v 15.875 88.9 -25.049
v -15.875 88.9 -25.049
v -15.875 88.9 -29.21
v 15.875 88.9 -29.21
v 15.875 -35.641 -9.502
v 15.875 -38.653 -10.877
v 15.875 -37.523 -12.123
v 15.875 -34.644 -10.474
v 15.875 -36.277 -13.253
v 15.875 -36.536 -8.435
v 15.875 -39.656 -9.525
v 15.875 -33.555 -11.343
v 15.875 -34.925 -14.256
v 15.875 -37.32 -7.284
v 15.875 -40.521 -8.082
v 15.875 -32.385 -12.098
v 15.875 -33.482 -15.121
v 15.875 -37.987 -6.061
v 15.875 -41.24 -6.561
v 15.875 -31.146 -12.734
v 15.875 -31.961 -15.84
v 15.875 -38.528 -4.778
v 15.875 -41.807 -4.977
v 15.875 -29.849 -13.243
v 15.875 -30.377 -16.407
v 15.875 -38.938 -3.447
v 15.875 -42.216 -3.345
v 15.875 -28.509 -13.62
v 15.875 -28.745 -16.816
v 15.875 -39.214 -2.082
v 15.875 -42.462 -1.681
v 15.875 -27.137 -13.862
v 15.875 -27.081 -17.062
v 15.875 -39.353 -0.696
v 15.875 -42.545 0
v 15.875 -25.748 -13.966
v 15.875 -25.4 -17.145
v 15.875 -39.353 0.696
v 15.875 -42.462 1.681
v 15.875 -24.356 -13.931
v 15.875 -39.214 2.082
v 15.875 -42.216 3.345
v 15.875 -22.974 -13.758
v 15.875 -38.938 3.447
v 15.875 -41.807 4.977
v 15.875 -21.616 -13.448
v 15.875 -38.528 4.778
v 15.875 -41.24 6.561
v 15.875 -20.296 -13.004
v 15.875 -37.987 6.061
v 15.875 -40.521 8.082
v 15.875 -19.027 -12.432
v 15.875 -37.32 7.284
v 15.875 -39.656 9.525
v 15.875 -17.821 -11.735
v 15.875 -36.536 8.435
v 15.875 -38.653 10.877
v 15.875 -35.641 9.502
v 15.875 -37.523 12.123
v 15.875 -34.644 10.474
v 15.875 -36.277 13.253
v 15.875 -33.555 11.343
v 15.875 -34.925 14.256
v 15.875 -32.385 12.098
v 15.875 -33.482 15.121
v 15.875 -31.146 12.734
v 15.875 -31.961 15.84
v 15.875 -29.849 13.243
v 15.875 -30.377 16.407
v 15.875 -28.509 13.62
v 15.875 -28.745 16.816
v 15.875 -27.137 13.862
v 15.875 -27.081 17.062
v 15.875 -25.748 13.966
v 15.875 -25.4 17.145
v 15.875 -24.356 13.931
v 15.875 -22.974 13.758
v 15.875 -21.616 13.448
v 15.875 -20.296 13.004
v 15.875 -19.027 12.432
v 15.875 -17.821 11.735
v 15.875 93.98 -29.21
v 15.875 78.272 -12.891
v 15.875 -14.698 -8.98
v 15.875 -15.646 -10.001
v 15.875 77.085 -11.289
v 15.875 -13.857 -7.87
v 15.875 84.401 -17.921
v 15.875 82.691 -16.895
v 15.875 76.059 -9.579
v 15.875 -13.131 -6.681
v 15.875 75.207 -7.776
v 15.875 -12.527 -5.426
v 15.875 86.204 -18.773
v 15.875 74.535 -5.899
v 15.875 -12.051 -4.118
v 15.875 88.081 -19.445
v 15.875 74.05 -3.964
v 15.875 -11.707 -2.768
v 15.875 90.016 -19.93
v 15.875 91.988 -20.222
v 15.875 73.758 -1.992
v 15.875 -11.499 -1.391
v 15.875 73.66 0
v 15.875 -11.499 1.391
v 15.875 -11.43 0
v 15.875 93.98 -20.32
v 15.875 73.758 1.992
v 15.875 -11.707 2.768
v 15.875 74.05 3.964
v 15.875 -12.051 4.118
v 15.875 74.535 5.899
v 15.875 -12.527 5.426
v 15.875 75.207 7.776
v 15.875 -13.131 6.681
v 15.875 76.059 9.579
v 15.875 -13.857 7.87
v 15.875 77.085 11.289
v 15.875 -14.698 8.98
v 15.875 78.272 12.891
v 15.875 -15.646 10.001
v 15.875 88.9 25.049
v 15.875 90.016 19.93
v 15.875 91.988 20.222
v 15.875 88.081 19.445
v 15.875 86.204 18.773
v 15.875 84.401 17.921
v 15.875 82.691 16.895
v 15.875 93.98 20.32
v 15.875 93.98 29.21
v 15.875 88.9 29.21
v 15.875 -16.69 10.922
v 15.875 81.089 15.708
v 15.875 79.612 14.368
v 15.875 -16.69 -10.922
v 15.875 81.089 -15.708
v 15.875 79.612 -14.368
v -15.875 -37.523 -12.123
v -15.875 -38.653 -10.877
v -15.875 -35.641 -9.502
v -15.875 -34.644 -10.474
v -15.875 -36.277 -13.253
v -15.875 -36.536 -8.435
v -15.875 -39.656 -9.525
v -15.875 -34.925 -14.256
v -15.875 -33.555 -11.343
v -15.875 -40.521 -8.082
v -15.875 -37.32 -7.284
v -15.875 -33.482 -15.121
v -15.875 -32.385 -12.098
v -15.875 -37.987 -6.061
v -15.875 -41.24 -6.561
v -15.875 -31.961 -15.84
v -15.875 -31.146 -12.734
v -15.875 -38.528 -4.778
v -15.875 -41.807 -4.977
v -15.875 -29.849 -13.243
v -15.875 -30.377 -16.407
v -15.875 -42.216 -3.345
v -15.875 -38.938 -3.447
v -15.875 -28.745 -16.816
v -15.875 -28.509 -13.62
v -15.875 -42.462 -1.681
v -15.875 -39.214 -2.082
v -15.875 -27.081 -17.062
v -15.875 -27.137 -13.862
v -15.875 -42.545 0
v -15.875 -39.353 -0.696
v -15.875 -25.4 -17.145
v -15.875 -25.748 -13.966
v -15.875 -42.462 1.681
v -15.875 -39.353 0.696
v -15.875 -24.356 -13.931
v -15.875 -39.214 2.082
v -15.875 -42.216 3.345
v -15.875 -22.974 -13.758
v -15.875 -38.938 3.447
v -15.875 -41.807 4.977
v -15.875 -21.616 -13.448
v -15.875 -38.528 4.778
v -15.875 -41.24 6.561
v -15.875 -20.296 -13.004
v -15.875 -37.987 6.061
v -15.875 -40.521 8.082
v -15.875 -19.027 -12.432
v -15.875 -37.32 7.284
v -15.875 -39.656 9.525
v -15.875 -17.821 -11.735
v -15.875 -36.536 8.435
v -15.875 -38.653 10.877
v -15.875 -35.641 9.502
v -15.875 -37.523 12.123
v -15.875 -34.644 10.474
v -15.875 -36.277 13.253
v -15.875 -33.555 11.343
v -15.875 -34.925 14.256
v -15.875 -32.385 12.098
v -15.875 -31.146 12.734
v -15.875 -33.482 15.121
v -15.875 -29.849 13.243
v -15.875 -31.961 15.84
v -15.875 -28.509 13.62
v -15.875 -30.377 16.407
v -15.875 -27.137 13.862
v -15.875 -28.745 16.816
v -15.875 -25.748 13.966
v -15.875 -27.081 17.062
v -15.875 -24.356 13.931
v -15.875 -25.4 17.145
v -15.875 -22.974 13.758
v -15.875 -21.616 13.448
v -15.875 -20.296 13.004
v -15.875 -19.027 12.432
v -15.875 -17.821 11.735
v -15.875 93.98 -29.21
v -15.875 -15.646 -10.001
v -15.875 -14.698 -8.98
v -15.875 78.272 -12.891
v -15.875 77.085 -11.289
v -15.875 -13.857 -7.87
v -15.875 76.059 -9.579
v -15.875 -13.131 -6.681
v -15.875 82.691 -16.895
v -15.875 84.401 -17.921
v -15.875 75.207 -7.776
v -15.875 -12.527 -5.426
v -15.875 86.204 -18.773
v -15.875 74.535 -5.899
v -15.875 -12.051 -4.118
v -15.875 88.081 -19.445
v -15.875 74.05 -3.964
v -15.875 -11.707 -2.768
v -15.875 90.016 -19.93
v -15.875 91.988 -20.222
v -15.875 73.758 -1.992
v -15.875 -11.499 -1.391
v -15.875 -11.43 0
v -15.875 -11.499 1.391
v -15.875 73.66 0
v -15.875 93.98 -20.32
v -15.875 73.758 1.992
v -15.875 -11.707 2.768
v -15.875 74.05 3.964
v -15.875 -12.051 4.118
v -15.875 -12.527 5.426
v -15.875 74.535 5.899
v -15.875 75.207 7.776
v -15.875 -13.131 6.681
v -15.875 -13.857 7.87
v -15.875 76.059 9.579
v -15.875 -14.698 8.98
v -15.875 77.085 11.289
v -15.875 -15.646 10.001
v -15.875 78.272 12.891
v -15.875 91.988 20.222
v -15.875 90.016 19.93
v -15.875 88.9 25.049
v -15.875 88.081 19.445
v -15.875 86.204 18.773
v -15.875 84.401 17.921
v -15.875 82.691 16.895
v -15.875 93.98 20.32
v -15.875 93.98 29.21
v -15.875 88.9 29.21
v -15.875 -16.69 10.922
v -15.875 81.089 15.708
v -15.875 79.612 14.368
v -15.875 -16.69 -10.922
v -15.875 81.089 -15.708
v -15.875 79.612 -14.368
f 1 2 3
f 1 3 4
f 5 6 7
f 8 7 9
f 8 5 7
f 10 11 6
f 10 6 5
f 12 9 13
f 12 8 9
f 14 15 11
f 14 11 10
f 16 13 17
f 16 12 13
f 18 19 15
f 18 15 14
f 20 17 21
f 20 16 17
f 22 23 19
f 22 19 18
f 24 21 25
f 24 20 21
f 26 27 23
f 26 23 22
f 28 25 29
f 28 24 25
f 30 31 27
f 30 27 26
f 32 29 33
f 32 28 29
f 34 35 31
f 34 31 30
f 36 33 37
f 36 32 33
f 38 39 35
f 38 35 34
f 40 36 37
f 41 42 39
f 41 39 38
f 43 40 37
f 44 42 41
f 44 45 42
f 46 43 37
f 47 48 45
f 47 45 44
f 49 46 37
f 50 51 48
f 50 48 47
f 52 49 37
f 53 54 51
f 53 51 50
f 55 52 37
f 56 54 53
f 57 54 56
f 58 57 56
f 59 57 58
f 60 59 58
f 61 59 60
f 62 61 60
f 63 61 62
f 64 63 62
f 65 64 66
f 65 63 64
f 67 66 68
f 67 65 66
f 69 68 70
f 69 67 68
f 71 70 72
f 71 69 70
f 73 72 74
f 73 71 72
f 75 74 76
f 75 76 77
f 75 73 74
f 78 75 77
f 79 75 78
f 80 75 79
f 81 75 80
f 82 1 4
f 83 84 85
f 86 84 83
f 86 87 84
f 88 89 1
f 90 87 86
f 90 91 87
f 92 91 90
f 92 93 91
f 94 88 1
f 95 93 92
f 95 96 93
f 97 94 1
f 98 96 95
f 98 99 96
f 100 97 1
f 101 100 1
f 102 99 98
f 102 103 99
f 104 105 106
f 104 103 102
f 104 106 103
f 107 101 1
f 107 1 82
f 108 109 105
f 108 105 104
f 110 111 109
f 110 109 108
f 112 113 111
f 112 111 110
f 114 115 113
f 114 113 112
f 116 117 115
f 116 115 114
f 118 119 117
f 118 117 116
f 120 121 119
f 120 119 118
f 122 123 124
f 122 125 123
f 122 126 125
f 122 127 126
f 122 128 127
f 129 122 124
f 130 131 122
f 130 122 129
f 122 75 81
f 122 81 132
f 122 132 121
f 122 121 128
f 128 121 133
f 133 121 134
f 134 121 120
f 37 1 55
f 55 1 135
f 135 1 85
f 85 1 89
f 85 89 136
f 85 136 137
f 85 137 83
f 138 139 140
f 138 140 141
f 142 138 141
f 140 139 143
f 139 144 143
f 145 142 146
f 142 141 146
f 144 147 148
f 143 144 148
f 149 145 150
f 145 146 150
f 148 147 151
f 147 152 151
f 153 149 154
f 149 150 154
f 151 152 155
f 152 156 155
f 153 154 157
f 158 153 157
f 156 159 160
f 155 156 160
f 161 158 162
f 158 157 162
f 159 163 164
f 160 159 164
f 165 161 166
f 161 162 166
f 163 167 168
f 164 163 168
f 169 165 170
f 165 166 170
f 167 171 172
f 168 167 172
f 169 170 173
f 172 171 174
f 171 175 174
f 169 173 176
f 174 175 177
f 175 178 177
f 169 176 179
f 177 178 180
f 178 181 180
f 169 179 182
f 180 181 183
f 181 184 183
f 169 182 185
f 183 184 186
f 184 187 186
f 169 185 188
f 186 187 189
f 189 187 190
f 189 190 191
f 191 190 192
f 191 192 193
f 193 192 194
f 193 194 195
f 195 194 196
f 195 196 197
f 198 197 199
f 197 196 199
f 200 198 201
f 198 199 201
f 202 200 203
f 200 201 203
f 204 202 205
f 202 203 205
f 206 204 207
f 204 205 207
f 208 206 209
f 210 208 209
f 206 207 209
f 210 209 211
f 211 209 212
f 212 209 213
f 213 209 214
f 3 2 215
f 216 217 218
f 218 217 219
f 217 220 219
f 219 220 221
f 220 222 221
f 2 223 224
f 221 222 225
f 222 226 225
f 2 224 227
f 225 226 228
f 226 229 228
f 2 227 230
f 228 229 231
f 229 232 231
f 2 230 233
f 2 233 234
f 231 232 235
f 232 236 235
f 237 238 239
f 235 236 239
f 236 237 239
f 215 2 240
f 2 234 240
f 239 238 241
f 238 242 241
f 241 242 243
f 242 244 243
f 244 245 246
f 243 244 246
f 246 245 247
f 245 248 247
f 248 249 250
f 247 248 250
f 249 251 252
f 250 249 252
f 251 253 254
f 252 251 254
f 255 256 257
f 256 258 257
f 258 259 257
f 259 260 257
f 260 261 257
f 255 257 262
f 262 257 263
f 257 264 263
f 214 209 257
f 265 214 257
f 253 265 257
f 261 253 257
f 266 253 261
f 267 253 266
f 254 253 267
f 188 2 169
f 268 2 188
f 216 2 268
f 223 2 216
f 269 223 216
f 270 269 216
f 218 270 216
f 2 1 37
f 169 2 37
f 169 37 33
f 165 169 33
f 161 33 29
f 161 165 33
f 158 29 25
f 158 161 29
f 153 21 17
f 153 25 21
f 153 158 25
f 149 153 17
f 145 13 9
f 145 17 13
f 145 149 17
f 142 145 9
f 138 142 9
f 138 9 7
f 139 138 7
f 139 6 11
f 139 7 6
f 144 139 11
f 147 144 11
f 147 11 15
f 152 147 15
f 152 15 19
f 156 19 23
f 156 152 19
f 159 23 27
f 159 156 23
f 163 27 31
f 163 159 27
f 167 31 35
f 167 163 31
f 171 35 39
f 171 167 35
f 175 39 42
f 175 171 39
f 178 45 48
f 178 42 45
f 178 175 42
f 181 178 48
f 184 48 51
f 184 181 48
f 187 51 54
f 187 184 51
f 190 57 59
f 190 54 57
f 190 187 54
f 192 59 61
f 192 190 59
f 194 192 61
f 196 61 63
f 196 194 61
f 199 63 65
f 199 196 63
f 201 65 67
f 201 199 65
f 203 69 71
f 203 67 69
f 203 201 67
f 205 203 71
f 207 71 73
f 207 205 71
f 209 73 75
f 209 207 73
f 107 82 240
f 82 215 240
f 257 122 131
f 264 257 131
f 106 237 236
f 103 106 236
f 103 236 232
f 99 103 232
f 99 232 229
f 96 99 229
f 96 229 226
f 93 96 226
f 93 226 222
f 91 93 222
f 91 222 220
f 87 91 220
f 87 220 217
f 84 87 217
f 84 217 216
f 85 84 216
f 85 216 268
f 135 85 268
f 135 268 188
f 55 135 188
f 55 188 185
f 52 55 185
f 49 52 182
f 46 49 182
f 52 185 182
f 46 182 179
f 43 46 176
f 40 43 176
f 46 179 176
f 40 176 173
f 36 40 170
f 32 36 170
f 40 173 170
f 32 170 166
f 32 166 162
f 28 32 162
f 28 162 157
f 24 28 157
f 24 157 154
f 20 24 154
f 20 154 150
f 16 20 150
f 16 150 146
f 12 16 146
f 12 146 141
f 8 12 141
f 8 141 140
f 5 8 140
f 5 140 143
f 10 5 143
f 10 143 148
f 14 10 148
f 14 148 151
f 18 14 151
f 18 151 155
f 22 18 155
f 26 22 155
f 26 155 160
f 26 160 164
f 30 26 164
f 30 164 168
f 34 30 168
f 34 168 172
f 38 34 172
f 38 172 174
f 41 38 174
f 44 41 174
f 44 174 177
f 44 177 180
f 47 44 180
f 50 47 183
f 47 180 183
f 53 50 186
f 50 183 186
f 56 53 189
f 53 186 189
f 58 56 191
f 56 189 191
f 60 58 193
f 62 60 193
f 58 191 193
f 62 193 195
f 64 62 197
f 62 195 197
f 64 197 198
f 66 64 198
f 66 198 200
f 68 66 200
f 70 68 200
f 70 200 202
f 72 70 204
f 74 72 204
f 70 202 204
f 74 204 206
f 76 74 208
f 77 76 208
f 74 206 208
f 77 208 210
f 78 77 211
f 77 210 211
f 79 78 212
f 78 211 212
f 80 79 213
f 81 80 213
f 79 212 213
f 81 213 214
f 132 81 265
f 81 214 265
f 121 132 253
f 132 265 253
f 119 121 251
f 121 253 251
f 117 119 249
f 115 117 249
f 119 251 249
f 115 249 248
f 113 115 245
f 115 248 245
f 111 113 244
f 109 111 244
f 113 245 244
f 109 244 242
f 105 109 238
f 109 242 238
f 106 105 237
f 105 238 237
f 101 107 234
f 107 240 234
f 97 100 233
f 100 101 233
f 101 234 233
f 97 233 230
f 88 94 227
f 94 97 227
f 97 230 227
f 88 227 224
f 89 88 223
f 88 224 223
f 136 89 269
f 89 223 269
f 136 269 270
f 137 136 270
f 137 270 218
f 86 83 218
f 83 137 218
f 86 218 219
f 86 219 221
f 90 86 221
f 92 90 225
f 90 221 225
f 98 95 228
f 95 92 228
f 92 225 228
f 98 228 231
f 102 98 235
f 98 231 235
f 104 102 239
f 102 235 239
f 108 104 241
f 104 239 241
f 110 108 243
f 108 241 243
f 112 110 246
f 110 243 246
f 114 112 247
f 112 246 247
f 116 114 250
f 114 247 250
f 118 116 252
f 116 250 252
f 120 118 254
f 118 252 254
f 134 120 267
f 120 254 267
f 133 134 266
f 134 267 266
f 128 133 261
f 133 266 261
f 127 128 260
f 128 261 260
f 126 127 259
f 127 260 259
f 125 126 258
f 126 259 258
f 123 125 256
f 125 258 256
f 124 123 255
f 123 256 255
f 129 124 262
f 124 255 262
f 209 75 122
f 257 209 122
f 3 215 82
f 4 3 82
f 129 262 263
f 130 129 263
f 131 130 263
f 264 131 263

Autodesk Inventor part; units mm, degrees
ref_plane "YZ Plane" through (0, 0, 0) normal (1, 0, 0) x (0, 1, 0)
sketch "Sketch1" plane through (0, 0, 0) normal (0, 1, 0) x (-1, 0, 0)
  circle A0 centre (0, 0) radius 43.18
  dimension "d0" = 86.36
extrude "Extrusion1" add sketch "Sketch1" against normal blind 63.5
sketch "Sketch2" plane through (0, 0, 0) normal (0, 0, 1) x (1, 0, 0)
  line L0 (-43.18, 0) -> (43.18, 0) projected
  arc A0 (-43.18, 0) -> (43.18, 0) centre (0, 24.003) ccw
  line L1 (-43.18, -63.5) -> (43.18, -63.5) projected
  point P0 (0, 0)
  dimension "d4" = 38.1
extrude "Extrusion2" cut sketch "Sketch2" along normal mid plane 101.6
ref_plane "Work Plane1" through (0, 0, 0) normal (0, -1, 0) x (1, 0, 0)
sketch "Sketch3" plane through (0, 0, 0) normal (0, -1, 0) x (1, 0, 0)
  circle A0 centre (0, 0) radius 38.1
  dimension "d8" = 76.2
extrude "Extrusion3" cut sketch "Sketch3" along normal blind 57.15
sketch "Sketch4" plane through (0, 0, 0) normal (1, 0, 0) x (0, 1, 0)
  circle A0 centre (-25.4, 0) radius 12.7
  point P0 (0, 0)
  dimension "d11" = 25.4
  dimension "d12" = 25.4
  dimension "d13" = 0
extrude "Extrusion4" add sketch "Sketch4" along normal mid plane 78.74
sketch "Sketch5" plane through (0, 0, 0) normal (1, 0, 0) x (0, 1, 0)
  circle A0 centre (-25.4, 0) radius 13.97
  arc A1 (-25.4, 17.145) -> (-25.4, -17.145) centre (-25.4, 0) ccw
  line L0 (-63.5, 43.18) -> (-63.5, -43.18) projected
  circle A2 centre (93.98, 0) radius 20.32
  arc A3 (90.484, -25.1583) -> (93.98, 25.4) centre (93.98, 0) ccw
  line L1 (93.98, 25.4) -> (-25.4, 17.145)
  line L2 (90.484, -25.1583) -> (-25.4, -17.145)
  point P0 (0, 0)
  point P1 (-25.4, 12.7)
  dimension "d16" = 27.94
  dimension "d17" = 34.29
  dimension "d18" = 38.1
  dimension "d19" = 43.18
  dimension "d20" = 40.64
  dimension "d21" = 0
  dimension "d22" = 119.38
  dimension "d23" = 50.8
extrude "Extrusion5" add sketch "Sketch5" along normal mid plane 31.75
sketch "Sketch6" plane through (0, 0, 0) normal (1, 0, 0) x (0, 1, 0)
  circle A0 centre (93.98, 0) radius 20.32 construction
  line L0 (93.98, 0) -> (93.98, -43.5701)
  line L1 (93.98, 0) -> (93.98, 40.9183)
  line L2 (93.98, 40.9183) -> (142.8926, 40.9183)
  line L3 (142.8926, 40.9183) -> (133.2711, -47.8298)
  line L4 (133.2711, -47.8298) -> (93.98, -43.5701)
  point P0 (0, 0)
extrude "Extrusion6" cut sketch "Sketch6" along normal mid plane 2540
ref_plane "Work Plane2" through (0, 0, -22.86) normal (0, 0, 1) x (1, 0, 0)
sketch "Sketch7" plane through (0, 0, -22.86) normal (0, 0, 1) x (1, 0, 0)
  line L0 (15.875, 90.484) -> (15.875, 93.98) projected
  line L1 (-15.875, -25.4) -> (-15.875, 93.98) construction
  line L2 (15.875, 93.98) -> (-15.875, 93.98)
  line L3 (-15.875, 93.98) -> (-15.875, 88.9)
  line L4 (-15.875, 88.9) -> (15.875, 88.9)
  line L5 (15.875, 88.9) -> (15.875, 93.98)
  point P0 (0, 0)
  dimension "d29" = 5.08
extrude "Extrusion7" add sketch "Sketch7" against normal blind 6.35
mirror "Mirror1" about plane through (0, 0, 0) normal (0, 0, 1) of "Extrusion7"
sketch "Sketch8" plane through (15.875, 0, 0) normal (1, 0, 0) x (0, 0, -1)
  circle A0 centre (0, -25.4) radius 13.97 projected
  line L0 (-20.32, 93.98) -> (-29.21, 93.98) projected
  arc A1 (-20.32, 93.98) -> (20.32, 93.98) centre (0, 93.98) ccw projected
  line L1 (20.32, 93.98) -> (29.21, 93.98) projected
  line L2 (29.21, 88.9) -> (29.21, 93.98) projected
  line L3 (25.0487, 88.9) -> (29.21, 88.9) projected
  line L4 (25.0487, 88.9) -> (17.145, -25.4) projected
  arc A2 (-17.145, -25.4) -> (17.145, -25.4) centre (0, -25.4) ccw projected
  line L5 (-17.145, -25.4) -> (-25.0487, 88.9) projected
  line L6 (-25.0487, 88.9) -> (-29.21, 88.9) projected
  line L7 (-29.21, 88.9) -> (-29.21, 93.98) projected
  point P0 (0, 0)
extrude "Extrusion8" cut sketch "Sketch8" against normal blind 38.1 keep common part
properties part number "PistonsRod"
